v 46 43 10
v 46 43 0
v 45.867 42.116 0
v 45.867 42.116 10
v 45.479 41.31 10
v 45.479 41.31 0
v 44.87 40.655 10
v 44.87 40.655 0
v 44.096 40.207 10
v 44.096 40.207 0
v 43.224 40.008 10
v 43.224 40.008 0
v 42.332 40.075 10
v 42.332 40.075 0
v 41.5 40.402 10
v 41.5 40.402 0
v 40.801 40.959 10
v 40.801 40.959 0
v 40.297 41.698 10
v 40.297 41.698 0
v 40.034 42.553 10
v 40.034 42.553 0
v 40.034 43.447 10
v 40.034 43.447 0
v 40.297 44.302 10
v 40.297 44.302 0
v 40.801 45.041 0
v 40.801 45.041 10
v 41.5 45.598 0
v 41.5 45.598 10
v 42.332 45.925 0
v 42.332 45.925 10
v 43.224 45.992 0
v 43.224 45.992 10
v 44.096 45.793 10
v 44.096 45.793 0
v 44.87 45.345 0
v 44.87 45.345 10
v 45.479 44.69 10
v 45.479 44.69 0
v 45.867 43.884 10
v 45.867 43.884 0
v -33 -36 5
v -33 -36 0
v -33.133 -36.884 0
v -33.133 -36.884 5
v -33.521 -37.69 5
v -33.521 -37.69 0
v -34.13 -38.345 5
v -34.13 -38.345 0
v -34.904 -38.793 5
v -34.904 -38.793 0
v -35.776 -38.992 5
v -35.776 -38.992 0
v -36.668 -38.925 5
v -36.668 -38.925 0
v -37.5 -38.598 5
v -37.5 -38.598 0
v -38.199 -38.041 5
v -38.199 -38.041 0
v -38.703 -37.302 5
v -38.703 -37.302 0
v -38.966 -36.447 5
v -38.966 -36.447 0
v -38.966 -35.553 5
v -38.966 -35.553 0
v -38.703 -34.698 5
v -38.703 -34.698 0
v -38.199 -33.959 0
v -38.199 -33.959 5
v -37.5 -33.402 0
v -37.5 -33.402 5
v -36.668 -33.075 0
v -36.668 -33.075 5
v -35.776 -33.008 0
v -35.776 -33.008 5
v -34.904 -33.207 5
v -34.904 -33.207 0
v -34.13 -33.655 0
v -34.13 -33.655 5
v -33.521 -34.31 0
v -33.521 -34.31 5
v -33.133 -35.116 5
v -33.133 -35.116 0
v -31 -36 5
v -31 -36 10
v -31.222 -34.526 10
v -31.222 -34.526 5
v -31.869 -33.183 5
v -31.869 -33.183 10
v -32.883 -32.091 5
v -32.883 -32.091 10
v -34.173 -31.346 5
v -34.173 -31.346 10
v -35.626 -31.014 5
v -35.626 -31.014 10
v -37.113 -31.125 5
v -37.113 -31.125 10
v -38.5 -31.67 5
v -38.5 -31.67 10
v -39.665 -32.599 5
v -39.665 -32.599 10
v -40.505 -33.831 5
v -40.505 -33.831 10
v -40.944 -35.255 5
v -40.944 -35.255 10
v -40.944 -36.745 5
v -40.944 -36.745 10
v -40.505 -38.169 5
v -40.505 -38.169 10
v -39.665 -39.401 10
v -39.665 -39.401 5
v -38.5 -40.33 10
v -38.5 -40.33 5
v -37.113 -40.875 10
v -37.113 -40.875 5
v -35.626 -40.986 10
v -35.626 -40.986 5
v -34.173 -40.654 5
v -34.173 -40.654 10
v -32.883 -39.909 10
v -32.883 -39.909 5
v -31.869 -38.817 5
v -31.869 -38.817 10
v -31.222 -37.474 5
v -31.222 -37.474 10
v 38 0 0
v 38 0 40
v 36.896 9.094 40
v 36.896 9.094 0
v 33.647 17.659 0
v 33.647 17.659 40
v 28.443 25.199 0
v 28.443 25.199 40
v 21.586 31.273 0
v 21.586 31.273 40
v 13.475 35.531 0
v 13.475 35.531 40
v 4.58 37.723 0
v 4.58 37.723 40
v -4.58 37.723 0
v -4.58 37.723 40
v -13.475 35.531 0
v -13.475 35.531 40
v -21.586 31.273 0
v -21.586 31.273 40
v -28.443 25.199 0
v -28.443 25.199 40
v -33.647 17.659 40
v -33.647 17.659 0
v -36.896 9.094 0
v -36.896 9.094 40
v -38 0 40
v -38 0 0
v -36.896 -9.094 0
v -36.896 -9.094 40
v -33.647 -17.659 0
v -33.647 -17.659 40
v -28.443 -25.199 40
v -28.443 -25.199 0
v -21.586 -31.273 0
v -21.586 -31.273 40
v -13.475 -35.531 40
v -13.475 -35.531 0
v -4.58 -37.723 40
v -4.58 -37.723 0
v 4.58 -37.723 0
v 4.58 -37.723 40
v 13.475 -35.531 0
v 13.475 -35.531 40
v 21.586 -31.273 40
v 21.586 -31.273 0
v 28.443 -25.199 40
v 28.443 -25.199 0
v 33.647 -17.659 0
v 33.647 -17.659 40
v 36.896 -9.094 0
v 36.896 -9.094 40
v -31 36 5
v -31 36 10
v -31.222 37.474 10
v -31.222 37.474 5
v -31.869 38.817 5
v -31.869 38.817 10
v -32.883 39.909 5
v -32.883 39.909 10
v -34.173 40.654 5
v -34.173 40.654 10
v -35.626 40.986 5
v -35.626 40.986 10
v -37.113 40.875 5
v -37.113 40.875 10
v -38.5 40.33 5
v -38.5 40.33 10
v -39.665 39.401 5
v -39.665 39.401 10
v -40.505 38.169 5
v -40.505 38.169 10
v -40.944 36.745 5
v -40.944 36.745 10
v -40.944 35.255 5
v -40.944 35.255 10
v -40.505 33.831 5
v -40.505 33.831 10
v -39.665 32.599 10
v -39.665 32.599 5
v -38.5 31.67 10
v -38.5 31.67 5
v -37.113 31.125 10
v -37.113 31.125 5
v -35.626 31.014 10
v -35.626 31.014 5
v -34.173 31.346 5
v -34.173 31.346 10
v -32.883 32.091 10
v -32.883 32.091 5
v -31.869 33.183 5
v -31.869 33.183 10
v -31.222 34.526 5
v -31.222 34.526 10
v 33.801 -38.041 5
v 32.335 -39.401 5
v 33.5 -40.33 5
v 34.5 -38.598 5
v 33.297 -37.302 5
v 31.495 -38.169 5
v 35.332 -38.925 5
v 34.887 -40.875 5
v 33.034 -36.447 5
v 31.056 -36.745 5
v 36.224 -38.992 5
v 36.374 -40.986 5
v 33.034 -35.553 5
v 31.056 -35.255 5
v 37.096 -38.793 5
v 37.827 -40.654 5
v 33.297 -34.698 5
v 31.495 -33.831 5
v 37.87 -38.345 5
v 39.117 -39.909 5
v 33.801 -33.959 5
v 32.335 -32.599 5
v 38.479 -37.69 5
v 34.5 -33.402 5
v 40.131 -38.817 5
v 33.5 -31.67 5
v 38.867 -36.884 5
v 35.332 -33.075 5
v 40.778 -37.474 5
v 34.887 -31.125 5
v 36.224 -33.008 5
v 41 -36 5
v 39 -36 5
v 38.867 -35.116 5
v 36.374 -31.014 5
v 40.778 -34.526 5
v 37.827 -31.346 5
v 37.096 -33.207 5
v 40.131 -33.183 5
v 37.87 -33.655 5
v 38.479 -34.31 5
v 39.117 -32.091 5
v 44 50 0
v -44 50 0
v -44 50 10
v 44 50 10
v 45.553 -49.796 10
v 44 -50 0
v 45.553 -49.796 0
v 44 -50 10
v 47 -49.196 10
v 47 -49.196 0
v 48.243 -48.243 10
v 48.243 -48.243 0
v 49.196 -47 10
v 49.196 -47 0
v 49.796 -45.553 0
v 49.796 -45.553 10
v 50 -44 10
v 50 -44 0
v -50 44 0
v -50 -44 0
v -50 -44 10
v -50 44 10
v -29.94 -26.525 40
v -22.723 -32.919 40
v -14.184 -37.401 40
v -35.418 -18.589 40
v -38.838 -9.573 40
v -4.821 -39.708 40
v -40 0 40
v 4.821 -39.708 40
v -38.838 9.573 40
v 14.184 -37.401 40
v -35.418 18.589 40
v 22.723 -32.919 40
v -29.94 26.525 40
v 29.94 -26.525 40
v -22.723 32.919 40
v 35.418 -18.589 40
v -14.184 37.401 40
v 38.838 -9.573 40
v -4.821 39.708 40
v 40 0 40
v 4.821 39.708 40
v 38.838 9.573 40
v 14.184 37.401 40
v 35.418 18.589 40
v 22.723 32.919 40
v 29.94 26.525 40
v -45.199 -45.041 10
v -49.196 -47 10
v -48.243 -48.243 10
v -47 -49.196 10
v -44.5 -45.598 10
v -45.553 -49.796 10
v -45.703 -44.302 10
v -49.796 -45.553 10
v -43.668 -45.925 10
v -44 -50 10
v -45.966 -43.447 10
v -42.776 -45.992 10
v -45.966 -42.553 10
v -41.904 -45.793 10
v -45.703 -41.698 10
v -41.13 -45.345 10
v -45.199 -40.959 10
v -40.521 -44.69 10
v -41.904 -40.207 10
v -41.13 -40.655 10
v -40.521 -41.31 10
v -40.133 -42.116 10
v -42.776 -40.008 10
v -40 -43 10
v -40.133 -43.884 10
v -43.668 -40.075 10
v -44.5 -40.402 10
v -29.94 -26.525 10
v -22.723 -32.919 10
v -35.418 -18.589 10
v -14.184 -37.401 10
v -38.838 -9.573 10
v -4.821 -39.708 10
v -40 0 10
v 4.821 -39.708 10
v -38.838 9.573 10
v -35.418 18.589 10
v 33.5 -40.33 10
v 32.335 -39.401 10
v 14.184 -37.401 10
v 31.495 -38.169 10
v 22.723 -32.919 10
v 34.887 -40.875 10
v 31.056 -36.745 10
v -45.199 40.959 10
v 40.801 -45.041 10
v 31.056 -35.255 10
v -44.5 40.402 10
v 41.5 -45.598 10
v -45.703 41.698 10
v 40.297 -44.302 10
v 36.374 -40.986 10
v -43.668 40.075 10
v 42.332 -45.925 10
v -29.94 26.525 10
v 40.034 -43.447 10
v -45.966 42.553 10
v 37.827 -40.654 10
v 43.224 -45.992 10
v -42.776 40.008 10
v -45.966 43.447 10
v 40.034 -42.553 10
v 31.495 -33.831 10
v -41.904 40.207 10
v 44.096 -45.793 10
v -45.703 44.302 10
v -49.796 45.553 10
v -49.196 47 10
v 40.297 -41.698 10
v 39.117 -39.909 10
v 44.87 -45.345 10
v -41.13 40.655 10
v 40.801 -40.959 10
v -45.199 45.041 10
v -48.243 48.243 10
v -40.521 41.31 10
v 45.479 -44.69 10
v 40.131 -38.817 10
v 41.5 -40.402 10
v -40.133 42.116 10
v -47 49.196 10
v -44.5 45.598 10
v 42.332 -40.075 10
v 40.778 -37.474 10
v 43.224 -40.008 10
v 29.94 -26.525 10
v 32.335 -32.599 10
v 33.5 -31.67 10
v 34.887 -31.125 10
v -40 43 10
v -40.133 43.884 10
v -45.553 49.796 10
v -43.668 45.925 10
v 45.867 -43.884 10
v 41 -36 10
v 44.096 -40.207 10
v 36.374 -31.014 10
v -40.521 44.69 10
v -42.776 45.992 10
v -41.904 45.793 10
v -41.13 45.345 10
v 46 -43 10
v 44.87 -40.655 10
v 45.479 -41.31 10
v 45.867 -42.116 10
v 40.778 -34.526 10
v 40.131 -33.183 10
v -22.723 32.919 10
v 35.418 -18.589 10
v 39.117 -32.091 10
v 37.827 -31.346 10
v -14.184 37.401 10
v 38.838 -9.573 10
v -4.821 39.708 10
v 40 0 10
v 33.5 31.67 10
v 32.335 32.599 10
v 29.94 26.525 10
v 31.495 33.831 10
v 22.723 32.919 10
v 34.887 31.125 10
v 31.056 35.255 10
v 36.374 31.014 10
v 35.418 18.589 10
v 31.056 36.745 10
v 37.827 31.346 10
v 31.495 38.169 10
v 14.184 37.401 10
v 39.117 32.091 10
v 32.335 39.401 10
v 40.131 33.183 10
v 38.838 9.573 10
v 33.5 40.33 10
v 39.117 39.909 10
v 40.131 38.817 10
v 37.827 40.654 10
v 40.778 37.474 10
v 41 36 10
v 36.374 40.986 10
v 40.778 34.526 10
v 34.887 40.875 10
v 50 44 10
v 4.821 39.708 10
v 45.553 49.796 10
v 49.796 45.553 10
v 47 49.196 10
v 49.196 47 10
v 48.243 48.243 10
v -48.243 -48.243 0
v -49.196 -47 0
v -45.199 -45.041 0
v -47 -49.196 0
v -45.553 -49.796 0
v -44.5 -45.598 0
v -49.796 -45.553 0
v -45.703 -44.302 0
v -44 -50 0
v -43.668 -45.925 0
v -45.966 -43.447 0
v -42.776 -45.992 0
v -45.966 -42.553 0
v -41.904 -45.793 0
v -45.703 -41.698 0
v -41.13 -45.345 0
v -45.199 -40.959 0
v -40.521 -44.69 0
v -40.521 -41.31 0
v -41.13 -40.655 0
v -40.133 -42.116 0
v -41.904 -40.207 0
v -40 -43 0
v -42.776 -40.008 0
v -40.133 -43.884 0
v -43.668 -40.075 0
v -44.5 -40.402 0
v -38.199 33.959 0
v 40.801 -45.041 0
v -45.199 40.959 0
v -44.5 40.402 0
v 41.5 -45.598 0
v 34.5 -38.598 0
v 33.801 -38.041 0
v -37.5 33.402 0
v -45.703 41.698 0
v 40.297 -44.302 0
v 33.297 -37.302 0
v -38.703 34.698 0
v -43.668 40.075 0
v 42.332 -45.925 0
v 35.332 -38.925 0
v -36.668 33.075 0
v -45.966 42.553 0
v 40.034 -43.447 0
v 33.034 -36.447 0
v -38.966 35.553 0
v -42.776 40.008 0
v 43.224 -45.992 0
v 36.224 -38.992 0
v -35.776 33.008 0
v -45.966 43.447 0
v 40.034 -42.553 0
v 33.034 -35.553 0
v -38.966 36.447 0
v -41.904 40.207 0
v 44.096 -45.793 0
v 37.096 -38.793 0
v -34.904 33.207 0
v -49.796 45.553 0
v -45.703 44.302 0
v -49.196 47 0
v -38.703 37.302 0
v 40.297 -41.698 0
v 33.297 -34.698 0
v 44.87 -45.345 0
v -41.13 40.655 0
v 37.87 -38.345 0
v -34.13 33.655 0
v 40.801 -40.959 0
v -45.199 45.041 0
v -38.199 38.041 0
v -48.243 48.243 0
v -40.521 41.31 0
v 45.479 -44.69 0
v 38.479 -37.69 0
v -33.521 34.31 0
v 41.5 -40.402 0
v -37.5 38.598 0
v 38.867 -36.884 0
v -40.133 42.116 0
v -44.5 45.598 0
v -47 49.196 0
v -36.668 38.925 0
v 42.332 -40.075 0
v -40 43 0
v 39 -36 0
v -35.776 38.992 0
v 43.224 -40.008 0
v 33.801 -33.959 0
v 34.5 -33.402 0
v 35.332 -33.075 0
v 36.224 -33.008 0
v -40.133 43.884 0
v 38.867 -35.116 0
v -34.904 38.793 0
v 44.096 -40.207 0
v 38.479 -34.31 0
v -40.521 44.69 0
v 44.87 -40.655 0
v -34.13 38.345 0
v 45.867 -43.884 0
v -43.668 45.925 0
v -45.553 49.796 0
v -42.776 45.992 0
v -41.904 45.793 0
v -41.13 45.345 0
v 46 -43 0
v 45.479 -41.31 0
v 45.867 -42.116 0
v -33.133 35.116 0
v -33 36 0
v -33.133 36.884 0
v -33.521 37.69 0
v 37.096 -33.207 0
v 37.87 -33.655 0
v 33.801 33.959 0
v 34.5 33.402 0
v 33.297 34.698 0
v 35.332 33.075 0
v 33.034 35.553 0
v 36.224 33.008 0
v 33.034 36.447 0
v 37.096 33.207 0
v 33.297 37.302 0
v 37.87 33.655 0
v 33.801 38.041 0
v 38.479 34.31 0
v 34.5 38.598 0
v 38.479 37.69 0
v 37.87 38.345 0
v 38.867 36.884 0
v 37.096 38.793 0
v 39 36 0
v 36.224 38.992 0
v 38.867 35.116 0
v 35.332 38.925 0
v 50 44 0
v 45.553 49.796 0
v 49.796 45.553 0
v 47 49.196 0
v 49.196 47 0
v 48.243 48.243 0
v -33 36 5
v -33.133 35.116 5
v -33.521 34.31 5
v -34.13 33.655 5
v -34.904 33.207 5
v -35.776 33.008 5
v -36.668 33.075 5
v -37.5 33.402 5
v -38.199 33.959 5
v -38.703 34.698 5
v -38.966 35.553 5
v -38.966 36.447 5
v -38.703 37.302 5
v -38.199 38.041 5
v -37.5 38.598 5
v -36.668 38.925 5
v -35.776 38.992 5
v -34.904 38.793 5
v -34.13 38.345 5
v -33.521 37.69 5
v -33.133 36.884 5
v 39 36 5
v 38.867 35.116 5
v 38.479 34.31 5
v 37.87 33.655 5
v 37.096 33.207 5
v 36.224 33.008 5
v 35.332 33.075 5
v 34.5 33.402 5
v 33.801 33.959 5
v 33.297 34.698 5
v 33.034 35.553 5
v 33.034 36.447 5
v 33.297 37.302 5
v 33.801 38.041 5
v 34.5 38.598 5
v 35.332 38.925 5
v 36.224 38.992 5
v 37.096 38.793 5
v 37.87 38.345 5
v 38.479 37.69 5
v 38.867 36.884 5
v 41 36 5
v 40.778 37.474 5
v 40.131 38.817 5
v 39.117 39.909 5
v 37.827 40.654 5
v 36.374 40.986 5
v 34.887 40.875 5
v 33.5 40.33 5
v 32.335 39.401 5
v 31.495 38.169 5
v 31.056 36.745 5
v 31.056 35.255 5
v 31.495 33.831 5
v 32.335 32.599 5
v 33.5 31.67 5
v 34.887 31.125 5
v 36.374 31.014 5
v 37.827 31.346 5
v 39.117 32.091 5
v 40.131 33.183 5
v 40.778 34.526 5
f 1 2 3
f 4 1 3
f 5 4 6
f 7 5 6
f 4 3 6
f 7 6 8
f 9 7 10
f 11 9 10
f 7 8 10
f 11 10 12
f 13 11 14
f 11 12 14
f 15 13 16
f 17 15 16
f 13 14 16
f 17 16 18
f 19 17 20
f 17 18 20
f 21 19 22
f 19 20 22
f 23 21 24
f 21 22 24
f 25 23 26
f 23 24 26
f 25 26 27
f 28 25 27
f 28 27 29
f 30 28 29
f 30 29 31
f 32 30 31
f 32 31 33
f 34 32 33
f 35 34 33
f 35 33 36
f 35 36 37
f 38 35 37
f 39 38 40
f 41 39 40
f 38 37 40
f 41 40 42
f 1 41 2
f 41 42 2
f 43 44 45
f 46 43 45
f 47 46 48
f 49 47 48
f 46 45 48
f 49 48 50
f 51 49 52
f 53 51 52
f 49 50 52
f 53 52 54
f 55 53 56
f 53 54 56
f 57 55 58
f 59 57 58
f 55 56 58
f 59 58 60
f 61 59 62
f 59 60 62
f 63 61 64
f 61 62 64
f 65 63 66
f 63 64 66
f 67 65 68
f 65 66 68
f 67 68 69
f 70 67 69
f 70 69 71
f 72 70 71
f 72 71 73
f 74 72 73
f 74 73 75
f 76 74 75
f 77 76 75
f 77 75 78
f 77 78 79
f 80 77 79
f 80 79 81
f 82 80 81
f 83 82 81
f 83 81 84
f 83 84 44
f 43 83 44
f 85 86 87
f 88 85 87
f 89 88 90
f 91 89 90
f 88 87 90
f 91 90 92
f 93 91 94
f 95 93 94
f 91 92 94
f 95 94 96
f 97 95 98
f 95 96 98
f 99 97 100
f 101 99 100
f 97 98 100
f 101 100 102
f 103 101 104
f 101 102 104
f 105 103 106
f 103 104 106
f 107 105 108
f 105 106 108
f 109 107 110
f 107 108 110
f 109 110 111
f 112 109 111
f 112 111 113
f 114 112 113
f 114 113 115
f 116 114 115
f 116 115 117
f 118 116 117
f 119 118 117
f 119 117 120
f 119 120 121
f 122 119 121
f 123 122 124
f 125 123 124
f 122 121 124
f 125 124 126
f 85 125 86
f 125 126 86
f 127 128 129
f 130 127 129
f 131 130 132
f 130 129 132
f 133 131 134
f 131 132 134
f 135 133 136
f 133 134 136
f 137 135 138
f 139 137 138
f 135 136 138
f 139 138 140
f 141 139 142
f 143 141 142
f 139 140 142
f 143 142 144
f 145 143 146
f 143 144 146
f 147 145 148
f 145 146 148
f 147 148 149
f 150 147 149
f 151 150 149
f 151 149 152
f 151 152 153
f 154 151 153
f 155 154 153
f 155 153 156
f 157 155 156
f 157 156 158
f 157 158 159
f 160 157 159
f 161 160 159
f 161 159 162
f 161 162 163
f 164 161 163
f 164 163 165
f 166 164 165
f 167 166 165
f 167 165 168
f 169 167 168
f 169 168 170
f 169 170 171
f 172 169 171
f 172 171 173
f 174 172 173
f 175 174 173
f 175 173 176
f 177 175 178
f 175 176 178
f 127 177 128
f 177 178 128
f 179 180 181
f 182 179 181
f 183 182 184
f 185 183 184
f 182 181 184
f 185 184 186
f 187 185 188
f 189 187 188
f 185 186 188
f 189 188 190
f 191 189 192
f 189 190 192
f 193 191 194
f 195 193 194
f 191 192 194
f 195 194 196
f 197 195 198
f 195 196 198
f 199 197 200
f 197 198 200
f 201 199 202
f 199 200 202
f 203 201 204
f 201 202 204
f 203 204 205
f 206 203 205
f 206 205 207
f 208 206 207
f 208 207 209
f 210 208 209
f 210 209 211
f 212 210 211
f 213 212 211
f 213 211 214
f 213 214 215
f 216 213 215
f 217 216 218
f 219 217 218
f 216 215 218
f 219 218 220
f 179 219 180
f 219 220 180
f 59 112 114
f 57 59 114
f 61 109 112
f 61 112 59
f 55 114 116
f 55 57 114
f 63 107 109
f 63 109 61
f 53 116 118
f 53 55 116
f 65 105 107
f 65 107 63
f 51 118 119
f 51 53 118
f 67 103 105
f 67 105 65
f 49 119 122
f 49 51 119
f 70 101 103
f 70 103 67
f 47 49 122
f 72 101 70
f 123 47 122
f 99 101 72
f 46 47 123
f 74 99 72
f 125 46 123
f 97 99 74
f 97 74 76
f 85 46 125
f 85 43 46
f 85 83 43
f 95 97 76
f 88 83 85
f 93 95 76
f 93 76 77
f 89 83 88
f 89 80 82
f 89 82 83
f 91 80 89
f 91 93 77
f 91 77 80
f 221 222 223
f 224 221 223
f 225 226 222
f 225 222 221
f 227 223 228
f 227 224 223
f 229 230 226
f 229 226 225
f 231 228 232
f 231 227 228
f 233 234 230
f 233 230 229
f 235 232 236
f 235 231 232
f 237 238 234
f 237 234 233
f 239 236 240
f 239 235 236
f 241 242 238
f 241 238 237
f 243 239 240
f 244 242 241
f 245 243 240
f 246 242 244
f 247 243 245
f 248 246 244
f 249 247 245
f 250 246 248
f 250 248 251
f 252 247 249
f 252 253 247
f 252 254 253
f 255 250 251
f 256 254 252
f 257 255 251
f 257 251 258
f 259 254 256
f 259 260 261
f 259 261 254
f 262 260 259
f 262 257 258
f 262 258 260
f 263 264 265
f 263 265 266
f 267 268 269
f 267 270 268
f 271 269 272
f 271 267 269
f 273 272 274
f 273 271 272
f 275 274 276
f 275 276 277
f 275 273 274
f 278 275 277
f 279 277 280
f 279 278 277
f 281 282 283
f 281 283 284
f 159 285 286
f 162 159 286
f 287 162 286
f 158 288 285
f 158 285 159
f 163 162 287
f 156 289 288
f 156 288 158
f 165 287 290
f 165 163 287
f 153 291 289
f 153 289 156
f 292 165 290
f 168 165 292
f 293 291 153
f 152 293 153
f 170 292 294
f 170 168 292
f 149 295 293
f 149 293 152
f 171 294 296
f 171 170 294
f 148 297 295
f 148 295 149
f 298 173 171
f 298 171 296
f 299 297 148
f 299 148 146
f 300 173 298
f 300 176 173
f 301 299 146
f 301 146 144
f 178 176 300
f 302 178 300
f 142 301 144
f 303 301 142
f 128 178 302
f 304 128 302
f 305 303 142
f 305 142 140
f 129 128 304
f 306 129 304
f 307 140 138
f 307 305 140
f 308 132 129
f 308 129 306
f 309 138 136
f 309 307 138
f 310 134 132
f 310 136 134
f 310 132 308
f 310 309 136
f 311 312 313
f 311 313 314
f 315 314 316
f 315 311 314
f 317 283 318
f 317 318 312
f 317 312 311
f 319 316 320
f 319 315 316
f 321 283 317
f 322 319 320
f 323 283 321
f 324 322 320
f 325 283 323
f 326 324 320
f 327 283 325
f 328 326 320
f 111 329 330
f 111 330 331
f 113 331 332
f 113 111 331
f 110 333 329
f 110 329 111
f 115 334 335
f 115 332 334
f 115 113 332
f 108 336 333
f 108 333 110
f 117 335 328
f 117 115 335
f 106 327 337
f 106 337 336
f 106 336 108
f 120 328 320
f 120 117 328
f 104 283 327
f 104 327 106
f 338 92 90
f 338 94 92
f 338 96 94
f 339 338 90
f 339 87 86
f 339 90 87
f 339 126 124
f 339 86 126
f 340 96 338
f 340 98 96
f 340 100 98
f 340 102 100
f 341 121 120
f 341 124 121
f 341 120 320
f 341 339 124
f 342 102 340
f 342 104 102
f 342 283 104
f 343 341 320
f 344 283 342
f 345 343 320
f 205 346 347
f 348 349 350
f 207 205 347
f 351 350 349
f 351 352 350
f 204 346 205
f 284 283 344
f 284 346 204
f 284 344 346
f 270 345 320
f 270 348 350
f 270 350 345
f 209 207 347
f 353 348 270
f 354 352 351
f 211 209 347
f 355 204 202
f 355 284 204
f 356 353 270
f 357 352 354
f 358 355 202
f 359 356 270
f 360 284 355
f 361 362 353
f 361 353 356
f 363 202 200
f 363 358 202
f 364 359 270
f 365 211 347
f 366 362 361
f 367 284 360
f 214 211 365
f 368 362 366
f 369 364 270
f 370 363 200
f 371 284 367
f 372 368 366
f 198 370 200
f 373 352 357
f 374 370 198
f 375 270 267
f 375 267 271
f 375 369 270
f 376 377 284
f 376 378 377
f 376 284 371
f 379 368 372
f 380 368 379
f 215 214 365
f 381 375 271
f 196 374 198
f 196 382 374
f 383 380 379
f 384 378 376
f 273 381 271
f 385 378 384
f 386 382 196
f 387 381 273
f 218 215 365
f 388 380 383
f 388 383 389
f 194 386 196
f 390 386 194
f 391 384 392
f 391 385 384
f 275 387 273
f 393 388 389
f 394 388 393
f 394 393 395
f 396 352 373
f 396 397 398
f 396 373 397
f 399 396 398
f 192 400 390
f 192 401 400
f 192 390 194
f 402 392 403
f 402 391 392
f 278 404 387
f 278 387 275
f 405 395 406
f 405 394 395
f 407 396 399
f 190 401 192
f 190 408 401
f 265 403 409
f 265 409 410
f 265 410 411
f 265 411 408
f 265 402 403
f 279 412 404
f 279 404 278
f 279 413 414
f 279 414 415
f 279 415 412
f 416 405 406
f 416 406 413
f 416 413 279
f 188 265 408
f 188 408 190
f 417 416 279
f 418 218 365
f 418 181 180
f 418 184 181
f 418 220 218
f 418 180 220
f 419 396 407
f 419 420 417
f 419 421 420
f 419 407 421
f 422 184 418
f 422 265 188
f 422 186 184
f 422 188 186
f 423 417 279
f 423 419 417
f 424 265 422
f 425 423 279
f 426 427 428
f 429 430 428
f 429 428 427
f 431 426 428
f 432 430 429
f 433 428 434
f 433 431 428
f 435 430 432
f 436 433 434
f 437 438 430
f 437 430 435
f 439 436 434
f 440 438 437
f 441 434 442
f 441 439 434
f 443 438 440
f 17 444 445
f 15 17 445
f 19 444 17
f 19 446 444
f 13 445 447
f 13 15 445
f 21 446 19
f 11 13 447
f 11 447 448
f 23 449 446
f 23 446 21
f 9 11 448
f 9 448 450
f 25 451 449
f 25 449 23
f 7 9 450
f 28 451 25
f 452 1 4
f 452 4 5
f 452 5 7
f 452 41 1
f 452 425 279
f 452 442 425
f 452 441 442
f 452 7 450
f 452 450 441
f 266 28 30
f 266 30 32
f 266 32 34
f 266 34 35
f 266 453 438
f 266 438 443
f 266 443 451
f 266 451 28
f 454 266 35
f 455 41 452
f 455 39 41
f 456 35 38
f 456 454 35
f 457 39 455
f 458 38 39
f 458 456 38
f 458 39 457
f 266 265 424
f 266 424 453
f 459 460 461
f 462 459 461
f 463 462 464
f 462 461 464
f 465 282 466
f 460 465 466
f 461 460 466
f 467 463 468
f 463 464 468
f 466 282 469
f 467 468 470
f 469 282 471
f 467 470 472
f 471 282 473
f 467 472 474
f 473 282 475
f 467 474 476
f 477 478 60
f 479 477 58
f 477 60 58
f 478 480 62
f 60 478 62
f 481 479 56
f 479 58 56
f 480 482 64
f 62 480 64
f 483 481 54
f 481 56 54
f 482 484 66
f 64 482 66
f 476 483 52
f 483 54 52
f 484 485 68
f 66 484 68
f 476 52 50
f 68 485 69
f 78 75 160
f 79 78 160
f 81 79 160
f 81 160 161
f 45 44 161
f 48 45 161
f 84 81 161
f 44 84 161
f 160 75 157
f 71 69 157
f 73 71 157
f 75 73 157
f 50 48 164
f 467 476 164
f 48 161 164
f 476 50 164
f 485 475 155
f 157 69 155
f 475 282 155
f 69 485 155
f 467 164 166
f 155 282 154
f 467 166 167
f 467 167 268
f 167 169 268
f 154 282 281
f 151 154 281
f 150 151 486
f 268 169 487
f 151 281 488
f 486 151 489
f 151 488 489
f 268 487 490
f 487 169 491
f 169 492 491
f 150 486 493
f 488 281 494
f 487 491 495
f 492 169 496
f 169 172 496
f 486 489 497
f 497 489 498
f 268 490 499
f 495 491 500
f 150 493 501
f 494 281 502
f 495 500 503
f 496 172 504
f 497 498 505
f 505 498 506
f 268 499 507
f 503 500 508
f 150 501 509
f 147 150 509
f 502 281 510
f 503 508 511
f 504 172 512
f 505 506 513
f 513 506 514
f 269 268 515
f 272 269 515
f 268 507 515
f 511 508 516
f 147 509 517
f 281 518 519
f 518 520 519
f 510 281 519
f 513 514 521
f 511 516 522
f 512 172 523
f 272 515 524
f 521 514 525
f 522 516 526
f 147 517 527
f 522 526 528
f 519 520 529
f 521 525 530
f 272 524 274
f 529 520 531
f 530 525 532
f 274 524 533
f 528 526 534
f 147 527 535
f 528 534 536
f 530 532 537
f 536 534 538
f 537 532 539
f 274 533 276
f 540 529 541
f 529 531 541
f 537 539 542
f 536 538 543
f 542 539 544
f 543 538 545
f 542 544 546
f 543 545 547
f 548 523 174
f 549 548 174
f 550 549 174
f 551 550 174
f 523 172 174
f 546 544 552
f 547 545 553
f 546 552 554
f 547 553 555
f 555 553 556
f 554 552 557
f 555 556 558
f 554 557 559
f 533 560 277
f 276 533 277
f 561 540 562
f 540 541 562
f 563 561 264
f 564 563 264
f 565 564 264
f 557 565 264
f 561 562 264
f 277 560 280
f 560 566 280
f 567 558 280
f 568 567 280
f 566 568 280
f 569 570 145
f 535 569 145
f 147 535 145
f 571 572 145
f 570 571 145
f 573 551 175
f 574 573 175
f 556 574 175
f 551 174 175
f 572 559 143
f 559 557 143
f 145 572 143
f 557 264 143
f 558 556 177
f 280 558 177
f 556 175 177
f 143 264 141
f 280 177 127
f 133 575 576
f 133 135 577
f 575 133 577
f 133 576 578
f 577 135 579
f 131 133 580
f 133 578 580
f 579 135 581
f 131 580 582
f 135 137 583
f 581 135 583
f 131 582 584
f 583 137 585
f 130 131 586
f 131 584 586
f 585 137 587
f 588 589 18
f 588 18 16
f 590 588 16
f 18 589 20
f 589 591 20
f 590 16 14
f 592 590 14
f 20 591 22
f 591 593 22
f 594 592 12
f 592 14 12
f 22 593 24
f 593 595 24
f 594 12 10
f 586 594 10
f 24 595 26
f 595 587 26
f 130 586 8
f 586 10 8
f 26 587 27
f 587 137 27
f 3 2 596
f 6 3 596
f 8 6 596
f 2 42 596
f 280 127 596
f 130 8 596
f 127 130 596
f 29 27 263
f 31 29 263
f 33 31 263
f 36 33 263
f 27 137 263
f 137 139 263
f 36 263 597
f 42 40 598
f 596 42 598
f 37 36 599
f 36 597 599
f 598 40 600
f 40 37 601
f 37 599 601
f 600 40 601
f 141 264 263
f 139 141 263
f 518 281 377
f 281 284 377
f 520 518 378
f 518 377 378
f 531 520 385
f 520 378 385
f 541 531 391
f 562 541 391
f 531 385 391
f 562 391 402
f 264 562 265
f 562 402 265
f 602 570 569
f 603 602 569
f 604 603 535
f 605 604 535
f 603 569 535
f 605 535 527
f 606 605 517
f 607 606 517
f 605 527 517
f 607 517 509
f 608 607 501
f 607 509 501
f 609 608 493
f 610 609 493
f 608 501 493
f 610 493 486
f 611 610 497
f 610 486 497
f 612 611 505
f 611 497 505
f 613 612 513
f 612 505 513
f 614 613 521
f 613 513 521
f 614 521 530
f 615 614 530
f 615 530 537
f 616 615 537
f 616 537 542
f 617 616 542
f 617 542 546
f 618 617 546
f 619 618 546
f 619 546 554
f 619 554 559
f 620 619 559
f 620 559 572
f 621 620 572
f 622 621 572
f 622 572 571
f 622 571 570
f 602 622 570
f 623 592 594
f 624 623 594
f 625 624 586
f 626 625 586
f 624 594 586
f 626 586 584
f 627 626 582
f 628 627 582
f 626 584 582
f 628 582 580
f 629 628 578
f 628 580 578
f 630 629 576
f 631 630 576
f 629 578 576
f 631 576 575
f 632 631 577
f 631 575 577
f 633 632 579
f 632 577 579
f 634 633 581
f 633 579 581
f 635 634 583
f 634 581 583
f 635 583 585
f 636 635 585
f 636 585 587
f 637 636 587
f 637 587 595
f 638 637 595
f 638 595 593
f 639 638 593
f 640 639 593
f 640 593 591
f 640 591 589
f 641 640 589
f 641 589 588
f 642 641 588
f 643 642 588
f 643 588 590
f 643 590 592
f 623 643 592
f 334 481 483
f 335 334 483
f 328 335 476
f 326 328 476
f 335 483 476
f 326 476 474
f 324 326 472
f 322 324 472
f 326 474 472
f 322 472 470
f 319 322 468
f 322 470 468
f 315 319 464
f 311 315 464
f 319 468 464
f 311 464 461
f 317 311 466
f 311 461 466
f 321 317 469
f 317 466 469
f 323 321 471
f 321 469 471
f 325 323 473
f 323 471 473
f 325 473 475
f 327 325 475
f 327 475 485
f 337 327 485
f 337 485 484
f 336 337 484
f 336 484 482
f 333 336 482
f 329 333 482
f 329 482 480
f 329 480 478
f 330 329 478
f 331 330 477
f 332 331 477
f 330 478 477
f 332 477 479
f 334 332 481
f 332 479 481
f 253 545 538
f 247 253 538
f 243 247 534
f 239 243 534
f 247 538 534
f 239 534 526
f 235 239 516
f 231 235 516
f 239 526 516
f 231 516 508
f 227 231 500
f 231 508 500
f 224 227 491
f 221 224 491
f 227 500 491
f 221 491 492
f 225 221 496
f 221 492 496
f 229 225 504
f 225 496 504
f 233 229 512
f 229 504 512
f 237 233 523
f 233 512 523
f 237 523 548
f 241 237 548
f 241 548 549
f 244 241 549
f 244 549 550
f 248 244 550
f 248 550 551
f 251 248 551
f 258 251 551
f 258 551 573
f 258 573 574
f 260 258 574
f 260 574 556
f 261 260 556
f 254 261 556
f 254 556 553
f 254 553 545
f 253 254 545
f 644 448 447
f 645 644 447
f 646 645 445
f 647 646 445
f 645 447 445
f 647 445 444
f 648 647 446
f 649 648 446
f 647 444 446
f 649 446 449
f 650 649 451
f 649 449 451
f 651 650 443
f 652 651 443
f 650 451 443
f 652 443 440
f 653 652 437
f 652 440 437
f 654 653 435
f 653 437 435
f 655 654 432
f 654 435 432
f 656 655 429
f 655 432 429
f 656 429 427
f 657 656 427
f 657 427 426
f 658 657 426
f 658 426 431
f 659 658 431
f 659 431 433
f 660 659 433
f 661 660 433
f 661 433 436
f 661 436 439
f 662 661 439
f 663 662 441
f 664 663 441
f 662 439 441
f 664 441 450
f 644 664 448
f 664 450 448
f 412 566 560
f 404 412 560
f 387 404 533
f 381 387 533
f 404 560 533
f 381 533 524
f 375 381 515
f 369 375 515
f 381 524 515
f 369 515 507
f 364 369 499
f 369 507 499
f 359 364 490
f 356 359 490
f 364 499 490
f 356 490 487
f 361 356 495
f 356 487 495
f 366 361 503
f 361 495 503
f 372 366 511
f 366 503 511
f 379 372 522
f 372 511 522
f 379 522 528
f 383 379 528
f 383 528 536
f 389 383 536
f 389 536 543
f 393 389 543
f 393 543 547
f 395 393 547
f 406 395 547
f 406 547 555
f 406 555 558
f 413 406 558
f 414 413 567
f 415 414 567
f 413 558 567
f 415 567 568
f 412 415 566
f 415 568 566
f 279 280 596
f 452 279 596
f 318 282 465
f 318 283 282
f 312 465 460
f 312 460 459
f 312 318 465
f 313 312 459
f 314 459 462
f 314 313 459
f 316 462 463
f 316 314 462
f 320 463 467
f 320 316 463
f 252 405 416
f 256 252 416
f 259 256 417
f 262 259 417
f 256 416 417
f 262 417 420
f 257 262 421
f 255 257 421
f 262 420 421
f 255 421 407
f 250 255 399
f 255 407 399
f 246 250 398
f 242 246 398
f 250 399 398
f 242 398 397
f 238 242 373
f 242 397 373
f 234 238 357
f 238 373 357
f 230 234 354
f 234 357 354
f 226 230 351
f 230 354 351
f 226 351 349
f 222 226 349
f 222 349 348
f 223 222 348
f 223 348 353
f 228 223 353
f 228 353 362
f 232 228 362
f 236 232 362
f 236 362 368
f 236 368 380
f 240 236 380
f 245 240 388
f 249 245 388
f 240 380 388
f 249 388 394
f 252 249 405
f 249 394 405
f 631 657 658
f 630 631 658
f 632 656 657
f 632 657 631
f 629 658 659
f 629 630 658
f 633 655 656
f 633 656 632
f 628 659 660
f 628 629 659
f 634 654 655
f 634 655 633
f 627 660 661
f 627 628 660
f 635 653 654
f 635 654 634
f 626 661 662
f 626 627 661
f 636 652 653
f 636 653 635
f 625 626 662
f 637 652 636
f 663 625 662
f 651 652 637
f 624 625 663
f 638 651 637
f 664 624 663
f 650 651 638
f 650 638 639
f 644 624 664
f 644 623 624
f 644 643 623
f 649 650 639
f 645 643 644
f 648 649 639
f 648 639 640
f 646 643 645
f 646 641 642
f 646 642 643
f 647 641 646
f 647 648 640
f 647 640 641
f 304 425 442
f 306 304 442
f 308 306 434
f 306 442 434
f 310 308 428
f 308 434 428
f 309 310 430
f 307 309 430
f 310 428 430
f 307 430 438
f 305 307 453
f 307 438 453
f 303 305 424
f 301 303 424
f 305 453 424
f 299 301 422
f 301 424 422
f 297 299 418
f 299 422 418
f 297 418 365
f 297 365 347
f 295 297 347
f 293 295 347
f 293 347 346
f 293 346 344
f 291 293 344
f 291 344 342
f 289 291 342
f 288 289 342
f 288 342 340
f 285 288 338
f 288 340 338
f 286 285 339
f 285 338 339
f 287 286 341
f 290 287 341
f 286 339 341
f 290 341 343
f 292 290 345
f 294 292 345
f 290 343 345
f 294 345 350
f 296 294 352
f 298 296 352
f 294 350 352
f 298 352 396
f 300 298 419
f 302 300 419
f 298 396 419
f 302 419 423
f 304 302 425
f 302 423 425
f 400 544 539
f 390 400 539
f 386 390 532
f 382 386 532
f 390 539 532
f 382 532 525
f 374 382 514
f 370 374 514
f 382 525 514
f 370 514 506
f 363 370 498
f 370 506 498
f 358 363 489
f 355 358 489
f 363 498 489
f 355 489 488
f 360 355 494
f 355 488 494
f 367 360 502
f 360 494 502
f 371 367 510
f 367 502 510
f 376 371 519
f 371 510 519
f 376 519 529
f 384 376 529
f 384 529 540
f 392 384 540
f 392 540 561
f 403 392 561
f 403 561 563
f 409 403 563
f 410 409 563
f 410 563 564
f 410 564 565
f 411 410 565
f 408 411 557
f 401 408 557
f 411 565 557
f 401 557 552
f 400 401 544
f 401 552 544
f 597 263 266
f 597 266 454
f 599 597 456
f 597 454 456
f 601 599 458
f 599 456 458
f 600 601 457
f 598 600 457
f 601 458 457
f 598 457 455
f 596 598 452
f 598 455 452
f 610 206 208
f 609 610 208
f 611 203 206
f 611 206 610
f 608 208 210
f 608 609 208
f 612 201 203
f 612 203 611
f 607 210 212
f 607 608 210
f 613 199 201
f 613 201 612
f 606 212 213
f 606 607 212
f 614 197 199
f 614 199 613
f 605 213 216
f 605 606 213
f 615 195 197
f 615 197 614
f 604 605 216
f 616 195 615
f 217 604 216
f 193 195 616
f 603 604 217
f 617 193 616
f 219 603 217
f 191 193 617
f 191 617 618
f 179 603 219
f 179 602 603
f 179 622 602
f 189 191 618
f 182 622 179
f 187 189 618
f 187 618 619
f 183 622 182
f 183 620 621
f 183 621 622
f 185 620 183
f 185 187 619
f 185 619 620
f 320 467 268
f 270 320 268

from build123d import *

# Parameters (mm, degrees)
SKETCH_W        = 100
SKETCH_H        = 100
PAD_DEPTH       = 10
SKETCH001_R     = 40
PAD001_DEPTH    = 30
SKETCH002_R     = 38
POCKET_DEPTH    = 55
SKETCH003_R     = 3
POCKET001_DEPTH = 10
SKETCH004_R     = 3
POCKET002_DEPTH = 10
SKETCH005_R     = 5
POCKET003_DEPTH = 5
FILLET_R        = 6


with BuildPart() as part:
    # Sketch → Pad (new body)
    with BuildSketch(Plane.XY):
        Rectangle(SKETCH_W, SKETCH_H)
    extrude(amount=PAD_DEPTH)

    # Sketch001 (on Face6 of Pad) → Pad001 (join)
    with BuildSketch(Plane.XY.offset(10)):
        Circle(SKETCH001_R)
    extrude(amount=PAD001_DEPTH)

    # Sketch002 (on Face8 of Pad001) → Pocket (cut)
    with BuildSketch(Plane.XY.offset(40)):
        Circle(SKETCH002_R)
    extrude(amount=-POCKET_DEPTH, mode=Mode.SUBTRACT)

    # Sketch003 (on Face4 of Pocket) → Pocket001 (cut)
    with BuildSketch(Plane(origin=(0, 0, 0), x_dir=(1, 0, 0), z_dir=(0, 0, -1))):
        with Locations((-36, 36)):
            Circle(SKETCH003_R)
        with Locations((36, 36)):
            Circle(SKETCH003_R)
        with Locations((36, -36)):
            Circle(SKETCH003_R)
        with Locations((-36, -36)):
            Circle(SKETCH003_R)
    extrude(amount=-POCKET001_DEPTH, mode=Mode.SUBTRACT)

    # Sketch004 (on Face4 of Pocket001) → Pocket002 (cut)
    with BuildSketch(Plane(origin=(0, 0, 0), x_dir=(1, 0, 0), z_dir=(0, 0, -1))):
        with Locations((-43, 43)):
            Circle(SKETCH004_R)
        with Locations((43, 43)):
            Circle(SKETCH004_R)
        with Locations((43, -43)):
            Circle(SKETCH004_R)
        with Locations((-43, -43)):
            Circle(SKETCH004_R)
    extrude(amount=-POCKET002_DEPTH, mode=Mode.SUBTRACT)

    # Sketch005 (on Face5 of Pocket002) → Pocket003 (cut)
    with BuildSketch(Plane.XY.offset(10)):
        with Locations((-36, 36)):
            Circle(SKETCH005_R)
        with Locations((36, 36)):
            Circle(SKETCH005_R)
        with Locations((36, -36)):
            Circle(SKETCH005_R)
        with Locations((-36, -36)):
            Circle(SKETCH005_R)
    extrude(amount=-POCKET003_DEPTH, mode=Mode.SUBTRACT)

    # Fillet
    fillet_edges = [part.edges().sort_by_distance(p)[0] for p in [
        (-50, -50, 5),
        (-50, 50, 5),
        (50, 50, 5),
        (50, -50, 5),
    ]]
    fillet(fillet_edges, radius=FILLET_R)


solid = part.part
